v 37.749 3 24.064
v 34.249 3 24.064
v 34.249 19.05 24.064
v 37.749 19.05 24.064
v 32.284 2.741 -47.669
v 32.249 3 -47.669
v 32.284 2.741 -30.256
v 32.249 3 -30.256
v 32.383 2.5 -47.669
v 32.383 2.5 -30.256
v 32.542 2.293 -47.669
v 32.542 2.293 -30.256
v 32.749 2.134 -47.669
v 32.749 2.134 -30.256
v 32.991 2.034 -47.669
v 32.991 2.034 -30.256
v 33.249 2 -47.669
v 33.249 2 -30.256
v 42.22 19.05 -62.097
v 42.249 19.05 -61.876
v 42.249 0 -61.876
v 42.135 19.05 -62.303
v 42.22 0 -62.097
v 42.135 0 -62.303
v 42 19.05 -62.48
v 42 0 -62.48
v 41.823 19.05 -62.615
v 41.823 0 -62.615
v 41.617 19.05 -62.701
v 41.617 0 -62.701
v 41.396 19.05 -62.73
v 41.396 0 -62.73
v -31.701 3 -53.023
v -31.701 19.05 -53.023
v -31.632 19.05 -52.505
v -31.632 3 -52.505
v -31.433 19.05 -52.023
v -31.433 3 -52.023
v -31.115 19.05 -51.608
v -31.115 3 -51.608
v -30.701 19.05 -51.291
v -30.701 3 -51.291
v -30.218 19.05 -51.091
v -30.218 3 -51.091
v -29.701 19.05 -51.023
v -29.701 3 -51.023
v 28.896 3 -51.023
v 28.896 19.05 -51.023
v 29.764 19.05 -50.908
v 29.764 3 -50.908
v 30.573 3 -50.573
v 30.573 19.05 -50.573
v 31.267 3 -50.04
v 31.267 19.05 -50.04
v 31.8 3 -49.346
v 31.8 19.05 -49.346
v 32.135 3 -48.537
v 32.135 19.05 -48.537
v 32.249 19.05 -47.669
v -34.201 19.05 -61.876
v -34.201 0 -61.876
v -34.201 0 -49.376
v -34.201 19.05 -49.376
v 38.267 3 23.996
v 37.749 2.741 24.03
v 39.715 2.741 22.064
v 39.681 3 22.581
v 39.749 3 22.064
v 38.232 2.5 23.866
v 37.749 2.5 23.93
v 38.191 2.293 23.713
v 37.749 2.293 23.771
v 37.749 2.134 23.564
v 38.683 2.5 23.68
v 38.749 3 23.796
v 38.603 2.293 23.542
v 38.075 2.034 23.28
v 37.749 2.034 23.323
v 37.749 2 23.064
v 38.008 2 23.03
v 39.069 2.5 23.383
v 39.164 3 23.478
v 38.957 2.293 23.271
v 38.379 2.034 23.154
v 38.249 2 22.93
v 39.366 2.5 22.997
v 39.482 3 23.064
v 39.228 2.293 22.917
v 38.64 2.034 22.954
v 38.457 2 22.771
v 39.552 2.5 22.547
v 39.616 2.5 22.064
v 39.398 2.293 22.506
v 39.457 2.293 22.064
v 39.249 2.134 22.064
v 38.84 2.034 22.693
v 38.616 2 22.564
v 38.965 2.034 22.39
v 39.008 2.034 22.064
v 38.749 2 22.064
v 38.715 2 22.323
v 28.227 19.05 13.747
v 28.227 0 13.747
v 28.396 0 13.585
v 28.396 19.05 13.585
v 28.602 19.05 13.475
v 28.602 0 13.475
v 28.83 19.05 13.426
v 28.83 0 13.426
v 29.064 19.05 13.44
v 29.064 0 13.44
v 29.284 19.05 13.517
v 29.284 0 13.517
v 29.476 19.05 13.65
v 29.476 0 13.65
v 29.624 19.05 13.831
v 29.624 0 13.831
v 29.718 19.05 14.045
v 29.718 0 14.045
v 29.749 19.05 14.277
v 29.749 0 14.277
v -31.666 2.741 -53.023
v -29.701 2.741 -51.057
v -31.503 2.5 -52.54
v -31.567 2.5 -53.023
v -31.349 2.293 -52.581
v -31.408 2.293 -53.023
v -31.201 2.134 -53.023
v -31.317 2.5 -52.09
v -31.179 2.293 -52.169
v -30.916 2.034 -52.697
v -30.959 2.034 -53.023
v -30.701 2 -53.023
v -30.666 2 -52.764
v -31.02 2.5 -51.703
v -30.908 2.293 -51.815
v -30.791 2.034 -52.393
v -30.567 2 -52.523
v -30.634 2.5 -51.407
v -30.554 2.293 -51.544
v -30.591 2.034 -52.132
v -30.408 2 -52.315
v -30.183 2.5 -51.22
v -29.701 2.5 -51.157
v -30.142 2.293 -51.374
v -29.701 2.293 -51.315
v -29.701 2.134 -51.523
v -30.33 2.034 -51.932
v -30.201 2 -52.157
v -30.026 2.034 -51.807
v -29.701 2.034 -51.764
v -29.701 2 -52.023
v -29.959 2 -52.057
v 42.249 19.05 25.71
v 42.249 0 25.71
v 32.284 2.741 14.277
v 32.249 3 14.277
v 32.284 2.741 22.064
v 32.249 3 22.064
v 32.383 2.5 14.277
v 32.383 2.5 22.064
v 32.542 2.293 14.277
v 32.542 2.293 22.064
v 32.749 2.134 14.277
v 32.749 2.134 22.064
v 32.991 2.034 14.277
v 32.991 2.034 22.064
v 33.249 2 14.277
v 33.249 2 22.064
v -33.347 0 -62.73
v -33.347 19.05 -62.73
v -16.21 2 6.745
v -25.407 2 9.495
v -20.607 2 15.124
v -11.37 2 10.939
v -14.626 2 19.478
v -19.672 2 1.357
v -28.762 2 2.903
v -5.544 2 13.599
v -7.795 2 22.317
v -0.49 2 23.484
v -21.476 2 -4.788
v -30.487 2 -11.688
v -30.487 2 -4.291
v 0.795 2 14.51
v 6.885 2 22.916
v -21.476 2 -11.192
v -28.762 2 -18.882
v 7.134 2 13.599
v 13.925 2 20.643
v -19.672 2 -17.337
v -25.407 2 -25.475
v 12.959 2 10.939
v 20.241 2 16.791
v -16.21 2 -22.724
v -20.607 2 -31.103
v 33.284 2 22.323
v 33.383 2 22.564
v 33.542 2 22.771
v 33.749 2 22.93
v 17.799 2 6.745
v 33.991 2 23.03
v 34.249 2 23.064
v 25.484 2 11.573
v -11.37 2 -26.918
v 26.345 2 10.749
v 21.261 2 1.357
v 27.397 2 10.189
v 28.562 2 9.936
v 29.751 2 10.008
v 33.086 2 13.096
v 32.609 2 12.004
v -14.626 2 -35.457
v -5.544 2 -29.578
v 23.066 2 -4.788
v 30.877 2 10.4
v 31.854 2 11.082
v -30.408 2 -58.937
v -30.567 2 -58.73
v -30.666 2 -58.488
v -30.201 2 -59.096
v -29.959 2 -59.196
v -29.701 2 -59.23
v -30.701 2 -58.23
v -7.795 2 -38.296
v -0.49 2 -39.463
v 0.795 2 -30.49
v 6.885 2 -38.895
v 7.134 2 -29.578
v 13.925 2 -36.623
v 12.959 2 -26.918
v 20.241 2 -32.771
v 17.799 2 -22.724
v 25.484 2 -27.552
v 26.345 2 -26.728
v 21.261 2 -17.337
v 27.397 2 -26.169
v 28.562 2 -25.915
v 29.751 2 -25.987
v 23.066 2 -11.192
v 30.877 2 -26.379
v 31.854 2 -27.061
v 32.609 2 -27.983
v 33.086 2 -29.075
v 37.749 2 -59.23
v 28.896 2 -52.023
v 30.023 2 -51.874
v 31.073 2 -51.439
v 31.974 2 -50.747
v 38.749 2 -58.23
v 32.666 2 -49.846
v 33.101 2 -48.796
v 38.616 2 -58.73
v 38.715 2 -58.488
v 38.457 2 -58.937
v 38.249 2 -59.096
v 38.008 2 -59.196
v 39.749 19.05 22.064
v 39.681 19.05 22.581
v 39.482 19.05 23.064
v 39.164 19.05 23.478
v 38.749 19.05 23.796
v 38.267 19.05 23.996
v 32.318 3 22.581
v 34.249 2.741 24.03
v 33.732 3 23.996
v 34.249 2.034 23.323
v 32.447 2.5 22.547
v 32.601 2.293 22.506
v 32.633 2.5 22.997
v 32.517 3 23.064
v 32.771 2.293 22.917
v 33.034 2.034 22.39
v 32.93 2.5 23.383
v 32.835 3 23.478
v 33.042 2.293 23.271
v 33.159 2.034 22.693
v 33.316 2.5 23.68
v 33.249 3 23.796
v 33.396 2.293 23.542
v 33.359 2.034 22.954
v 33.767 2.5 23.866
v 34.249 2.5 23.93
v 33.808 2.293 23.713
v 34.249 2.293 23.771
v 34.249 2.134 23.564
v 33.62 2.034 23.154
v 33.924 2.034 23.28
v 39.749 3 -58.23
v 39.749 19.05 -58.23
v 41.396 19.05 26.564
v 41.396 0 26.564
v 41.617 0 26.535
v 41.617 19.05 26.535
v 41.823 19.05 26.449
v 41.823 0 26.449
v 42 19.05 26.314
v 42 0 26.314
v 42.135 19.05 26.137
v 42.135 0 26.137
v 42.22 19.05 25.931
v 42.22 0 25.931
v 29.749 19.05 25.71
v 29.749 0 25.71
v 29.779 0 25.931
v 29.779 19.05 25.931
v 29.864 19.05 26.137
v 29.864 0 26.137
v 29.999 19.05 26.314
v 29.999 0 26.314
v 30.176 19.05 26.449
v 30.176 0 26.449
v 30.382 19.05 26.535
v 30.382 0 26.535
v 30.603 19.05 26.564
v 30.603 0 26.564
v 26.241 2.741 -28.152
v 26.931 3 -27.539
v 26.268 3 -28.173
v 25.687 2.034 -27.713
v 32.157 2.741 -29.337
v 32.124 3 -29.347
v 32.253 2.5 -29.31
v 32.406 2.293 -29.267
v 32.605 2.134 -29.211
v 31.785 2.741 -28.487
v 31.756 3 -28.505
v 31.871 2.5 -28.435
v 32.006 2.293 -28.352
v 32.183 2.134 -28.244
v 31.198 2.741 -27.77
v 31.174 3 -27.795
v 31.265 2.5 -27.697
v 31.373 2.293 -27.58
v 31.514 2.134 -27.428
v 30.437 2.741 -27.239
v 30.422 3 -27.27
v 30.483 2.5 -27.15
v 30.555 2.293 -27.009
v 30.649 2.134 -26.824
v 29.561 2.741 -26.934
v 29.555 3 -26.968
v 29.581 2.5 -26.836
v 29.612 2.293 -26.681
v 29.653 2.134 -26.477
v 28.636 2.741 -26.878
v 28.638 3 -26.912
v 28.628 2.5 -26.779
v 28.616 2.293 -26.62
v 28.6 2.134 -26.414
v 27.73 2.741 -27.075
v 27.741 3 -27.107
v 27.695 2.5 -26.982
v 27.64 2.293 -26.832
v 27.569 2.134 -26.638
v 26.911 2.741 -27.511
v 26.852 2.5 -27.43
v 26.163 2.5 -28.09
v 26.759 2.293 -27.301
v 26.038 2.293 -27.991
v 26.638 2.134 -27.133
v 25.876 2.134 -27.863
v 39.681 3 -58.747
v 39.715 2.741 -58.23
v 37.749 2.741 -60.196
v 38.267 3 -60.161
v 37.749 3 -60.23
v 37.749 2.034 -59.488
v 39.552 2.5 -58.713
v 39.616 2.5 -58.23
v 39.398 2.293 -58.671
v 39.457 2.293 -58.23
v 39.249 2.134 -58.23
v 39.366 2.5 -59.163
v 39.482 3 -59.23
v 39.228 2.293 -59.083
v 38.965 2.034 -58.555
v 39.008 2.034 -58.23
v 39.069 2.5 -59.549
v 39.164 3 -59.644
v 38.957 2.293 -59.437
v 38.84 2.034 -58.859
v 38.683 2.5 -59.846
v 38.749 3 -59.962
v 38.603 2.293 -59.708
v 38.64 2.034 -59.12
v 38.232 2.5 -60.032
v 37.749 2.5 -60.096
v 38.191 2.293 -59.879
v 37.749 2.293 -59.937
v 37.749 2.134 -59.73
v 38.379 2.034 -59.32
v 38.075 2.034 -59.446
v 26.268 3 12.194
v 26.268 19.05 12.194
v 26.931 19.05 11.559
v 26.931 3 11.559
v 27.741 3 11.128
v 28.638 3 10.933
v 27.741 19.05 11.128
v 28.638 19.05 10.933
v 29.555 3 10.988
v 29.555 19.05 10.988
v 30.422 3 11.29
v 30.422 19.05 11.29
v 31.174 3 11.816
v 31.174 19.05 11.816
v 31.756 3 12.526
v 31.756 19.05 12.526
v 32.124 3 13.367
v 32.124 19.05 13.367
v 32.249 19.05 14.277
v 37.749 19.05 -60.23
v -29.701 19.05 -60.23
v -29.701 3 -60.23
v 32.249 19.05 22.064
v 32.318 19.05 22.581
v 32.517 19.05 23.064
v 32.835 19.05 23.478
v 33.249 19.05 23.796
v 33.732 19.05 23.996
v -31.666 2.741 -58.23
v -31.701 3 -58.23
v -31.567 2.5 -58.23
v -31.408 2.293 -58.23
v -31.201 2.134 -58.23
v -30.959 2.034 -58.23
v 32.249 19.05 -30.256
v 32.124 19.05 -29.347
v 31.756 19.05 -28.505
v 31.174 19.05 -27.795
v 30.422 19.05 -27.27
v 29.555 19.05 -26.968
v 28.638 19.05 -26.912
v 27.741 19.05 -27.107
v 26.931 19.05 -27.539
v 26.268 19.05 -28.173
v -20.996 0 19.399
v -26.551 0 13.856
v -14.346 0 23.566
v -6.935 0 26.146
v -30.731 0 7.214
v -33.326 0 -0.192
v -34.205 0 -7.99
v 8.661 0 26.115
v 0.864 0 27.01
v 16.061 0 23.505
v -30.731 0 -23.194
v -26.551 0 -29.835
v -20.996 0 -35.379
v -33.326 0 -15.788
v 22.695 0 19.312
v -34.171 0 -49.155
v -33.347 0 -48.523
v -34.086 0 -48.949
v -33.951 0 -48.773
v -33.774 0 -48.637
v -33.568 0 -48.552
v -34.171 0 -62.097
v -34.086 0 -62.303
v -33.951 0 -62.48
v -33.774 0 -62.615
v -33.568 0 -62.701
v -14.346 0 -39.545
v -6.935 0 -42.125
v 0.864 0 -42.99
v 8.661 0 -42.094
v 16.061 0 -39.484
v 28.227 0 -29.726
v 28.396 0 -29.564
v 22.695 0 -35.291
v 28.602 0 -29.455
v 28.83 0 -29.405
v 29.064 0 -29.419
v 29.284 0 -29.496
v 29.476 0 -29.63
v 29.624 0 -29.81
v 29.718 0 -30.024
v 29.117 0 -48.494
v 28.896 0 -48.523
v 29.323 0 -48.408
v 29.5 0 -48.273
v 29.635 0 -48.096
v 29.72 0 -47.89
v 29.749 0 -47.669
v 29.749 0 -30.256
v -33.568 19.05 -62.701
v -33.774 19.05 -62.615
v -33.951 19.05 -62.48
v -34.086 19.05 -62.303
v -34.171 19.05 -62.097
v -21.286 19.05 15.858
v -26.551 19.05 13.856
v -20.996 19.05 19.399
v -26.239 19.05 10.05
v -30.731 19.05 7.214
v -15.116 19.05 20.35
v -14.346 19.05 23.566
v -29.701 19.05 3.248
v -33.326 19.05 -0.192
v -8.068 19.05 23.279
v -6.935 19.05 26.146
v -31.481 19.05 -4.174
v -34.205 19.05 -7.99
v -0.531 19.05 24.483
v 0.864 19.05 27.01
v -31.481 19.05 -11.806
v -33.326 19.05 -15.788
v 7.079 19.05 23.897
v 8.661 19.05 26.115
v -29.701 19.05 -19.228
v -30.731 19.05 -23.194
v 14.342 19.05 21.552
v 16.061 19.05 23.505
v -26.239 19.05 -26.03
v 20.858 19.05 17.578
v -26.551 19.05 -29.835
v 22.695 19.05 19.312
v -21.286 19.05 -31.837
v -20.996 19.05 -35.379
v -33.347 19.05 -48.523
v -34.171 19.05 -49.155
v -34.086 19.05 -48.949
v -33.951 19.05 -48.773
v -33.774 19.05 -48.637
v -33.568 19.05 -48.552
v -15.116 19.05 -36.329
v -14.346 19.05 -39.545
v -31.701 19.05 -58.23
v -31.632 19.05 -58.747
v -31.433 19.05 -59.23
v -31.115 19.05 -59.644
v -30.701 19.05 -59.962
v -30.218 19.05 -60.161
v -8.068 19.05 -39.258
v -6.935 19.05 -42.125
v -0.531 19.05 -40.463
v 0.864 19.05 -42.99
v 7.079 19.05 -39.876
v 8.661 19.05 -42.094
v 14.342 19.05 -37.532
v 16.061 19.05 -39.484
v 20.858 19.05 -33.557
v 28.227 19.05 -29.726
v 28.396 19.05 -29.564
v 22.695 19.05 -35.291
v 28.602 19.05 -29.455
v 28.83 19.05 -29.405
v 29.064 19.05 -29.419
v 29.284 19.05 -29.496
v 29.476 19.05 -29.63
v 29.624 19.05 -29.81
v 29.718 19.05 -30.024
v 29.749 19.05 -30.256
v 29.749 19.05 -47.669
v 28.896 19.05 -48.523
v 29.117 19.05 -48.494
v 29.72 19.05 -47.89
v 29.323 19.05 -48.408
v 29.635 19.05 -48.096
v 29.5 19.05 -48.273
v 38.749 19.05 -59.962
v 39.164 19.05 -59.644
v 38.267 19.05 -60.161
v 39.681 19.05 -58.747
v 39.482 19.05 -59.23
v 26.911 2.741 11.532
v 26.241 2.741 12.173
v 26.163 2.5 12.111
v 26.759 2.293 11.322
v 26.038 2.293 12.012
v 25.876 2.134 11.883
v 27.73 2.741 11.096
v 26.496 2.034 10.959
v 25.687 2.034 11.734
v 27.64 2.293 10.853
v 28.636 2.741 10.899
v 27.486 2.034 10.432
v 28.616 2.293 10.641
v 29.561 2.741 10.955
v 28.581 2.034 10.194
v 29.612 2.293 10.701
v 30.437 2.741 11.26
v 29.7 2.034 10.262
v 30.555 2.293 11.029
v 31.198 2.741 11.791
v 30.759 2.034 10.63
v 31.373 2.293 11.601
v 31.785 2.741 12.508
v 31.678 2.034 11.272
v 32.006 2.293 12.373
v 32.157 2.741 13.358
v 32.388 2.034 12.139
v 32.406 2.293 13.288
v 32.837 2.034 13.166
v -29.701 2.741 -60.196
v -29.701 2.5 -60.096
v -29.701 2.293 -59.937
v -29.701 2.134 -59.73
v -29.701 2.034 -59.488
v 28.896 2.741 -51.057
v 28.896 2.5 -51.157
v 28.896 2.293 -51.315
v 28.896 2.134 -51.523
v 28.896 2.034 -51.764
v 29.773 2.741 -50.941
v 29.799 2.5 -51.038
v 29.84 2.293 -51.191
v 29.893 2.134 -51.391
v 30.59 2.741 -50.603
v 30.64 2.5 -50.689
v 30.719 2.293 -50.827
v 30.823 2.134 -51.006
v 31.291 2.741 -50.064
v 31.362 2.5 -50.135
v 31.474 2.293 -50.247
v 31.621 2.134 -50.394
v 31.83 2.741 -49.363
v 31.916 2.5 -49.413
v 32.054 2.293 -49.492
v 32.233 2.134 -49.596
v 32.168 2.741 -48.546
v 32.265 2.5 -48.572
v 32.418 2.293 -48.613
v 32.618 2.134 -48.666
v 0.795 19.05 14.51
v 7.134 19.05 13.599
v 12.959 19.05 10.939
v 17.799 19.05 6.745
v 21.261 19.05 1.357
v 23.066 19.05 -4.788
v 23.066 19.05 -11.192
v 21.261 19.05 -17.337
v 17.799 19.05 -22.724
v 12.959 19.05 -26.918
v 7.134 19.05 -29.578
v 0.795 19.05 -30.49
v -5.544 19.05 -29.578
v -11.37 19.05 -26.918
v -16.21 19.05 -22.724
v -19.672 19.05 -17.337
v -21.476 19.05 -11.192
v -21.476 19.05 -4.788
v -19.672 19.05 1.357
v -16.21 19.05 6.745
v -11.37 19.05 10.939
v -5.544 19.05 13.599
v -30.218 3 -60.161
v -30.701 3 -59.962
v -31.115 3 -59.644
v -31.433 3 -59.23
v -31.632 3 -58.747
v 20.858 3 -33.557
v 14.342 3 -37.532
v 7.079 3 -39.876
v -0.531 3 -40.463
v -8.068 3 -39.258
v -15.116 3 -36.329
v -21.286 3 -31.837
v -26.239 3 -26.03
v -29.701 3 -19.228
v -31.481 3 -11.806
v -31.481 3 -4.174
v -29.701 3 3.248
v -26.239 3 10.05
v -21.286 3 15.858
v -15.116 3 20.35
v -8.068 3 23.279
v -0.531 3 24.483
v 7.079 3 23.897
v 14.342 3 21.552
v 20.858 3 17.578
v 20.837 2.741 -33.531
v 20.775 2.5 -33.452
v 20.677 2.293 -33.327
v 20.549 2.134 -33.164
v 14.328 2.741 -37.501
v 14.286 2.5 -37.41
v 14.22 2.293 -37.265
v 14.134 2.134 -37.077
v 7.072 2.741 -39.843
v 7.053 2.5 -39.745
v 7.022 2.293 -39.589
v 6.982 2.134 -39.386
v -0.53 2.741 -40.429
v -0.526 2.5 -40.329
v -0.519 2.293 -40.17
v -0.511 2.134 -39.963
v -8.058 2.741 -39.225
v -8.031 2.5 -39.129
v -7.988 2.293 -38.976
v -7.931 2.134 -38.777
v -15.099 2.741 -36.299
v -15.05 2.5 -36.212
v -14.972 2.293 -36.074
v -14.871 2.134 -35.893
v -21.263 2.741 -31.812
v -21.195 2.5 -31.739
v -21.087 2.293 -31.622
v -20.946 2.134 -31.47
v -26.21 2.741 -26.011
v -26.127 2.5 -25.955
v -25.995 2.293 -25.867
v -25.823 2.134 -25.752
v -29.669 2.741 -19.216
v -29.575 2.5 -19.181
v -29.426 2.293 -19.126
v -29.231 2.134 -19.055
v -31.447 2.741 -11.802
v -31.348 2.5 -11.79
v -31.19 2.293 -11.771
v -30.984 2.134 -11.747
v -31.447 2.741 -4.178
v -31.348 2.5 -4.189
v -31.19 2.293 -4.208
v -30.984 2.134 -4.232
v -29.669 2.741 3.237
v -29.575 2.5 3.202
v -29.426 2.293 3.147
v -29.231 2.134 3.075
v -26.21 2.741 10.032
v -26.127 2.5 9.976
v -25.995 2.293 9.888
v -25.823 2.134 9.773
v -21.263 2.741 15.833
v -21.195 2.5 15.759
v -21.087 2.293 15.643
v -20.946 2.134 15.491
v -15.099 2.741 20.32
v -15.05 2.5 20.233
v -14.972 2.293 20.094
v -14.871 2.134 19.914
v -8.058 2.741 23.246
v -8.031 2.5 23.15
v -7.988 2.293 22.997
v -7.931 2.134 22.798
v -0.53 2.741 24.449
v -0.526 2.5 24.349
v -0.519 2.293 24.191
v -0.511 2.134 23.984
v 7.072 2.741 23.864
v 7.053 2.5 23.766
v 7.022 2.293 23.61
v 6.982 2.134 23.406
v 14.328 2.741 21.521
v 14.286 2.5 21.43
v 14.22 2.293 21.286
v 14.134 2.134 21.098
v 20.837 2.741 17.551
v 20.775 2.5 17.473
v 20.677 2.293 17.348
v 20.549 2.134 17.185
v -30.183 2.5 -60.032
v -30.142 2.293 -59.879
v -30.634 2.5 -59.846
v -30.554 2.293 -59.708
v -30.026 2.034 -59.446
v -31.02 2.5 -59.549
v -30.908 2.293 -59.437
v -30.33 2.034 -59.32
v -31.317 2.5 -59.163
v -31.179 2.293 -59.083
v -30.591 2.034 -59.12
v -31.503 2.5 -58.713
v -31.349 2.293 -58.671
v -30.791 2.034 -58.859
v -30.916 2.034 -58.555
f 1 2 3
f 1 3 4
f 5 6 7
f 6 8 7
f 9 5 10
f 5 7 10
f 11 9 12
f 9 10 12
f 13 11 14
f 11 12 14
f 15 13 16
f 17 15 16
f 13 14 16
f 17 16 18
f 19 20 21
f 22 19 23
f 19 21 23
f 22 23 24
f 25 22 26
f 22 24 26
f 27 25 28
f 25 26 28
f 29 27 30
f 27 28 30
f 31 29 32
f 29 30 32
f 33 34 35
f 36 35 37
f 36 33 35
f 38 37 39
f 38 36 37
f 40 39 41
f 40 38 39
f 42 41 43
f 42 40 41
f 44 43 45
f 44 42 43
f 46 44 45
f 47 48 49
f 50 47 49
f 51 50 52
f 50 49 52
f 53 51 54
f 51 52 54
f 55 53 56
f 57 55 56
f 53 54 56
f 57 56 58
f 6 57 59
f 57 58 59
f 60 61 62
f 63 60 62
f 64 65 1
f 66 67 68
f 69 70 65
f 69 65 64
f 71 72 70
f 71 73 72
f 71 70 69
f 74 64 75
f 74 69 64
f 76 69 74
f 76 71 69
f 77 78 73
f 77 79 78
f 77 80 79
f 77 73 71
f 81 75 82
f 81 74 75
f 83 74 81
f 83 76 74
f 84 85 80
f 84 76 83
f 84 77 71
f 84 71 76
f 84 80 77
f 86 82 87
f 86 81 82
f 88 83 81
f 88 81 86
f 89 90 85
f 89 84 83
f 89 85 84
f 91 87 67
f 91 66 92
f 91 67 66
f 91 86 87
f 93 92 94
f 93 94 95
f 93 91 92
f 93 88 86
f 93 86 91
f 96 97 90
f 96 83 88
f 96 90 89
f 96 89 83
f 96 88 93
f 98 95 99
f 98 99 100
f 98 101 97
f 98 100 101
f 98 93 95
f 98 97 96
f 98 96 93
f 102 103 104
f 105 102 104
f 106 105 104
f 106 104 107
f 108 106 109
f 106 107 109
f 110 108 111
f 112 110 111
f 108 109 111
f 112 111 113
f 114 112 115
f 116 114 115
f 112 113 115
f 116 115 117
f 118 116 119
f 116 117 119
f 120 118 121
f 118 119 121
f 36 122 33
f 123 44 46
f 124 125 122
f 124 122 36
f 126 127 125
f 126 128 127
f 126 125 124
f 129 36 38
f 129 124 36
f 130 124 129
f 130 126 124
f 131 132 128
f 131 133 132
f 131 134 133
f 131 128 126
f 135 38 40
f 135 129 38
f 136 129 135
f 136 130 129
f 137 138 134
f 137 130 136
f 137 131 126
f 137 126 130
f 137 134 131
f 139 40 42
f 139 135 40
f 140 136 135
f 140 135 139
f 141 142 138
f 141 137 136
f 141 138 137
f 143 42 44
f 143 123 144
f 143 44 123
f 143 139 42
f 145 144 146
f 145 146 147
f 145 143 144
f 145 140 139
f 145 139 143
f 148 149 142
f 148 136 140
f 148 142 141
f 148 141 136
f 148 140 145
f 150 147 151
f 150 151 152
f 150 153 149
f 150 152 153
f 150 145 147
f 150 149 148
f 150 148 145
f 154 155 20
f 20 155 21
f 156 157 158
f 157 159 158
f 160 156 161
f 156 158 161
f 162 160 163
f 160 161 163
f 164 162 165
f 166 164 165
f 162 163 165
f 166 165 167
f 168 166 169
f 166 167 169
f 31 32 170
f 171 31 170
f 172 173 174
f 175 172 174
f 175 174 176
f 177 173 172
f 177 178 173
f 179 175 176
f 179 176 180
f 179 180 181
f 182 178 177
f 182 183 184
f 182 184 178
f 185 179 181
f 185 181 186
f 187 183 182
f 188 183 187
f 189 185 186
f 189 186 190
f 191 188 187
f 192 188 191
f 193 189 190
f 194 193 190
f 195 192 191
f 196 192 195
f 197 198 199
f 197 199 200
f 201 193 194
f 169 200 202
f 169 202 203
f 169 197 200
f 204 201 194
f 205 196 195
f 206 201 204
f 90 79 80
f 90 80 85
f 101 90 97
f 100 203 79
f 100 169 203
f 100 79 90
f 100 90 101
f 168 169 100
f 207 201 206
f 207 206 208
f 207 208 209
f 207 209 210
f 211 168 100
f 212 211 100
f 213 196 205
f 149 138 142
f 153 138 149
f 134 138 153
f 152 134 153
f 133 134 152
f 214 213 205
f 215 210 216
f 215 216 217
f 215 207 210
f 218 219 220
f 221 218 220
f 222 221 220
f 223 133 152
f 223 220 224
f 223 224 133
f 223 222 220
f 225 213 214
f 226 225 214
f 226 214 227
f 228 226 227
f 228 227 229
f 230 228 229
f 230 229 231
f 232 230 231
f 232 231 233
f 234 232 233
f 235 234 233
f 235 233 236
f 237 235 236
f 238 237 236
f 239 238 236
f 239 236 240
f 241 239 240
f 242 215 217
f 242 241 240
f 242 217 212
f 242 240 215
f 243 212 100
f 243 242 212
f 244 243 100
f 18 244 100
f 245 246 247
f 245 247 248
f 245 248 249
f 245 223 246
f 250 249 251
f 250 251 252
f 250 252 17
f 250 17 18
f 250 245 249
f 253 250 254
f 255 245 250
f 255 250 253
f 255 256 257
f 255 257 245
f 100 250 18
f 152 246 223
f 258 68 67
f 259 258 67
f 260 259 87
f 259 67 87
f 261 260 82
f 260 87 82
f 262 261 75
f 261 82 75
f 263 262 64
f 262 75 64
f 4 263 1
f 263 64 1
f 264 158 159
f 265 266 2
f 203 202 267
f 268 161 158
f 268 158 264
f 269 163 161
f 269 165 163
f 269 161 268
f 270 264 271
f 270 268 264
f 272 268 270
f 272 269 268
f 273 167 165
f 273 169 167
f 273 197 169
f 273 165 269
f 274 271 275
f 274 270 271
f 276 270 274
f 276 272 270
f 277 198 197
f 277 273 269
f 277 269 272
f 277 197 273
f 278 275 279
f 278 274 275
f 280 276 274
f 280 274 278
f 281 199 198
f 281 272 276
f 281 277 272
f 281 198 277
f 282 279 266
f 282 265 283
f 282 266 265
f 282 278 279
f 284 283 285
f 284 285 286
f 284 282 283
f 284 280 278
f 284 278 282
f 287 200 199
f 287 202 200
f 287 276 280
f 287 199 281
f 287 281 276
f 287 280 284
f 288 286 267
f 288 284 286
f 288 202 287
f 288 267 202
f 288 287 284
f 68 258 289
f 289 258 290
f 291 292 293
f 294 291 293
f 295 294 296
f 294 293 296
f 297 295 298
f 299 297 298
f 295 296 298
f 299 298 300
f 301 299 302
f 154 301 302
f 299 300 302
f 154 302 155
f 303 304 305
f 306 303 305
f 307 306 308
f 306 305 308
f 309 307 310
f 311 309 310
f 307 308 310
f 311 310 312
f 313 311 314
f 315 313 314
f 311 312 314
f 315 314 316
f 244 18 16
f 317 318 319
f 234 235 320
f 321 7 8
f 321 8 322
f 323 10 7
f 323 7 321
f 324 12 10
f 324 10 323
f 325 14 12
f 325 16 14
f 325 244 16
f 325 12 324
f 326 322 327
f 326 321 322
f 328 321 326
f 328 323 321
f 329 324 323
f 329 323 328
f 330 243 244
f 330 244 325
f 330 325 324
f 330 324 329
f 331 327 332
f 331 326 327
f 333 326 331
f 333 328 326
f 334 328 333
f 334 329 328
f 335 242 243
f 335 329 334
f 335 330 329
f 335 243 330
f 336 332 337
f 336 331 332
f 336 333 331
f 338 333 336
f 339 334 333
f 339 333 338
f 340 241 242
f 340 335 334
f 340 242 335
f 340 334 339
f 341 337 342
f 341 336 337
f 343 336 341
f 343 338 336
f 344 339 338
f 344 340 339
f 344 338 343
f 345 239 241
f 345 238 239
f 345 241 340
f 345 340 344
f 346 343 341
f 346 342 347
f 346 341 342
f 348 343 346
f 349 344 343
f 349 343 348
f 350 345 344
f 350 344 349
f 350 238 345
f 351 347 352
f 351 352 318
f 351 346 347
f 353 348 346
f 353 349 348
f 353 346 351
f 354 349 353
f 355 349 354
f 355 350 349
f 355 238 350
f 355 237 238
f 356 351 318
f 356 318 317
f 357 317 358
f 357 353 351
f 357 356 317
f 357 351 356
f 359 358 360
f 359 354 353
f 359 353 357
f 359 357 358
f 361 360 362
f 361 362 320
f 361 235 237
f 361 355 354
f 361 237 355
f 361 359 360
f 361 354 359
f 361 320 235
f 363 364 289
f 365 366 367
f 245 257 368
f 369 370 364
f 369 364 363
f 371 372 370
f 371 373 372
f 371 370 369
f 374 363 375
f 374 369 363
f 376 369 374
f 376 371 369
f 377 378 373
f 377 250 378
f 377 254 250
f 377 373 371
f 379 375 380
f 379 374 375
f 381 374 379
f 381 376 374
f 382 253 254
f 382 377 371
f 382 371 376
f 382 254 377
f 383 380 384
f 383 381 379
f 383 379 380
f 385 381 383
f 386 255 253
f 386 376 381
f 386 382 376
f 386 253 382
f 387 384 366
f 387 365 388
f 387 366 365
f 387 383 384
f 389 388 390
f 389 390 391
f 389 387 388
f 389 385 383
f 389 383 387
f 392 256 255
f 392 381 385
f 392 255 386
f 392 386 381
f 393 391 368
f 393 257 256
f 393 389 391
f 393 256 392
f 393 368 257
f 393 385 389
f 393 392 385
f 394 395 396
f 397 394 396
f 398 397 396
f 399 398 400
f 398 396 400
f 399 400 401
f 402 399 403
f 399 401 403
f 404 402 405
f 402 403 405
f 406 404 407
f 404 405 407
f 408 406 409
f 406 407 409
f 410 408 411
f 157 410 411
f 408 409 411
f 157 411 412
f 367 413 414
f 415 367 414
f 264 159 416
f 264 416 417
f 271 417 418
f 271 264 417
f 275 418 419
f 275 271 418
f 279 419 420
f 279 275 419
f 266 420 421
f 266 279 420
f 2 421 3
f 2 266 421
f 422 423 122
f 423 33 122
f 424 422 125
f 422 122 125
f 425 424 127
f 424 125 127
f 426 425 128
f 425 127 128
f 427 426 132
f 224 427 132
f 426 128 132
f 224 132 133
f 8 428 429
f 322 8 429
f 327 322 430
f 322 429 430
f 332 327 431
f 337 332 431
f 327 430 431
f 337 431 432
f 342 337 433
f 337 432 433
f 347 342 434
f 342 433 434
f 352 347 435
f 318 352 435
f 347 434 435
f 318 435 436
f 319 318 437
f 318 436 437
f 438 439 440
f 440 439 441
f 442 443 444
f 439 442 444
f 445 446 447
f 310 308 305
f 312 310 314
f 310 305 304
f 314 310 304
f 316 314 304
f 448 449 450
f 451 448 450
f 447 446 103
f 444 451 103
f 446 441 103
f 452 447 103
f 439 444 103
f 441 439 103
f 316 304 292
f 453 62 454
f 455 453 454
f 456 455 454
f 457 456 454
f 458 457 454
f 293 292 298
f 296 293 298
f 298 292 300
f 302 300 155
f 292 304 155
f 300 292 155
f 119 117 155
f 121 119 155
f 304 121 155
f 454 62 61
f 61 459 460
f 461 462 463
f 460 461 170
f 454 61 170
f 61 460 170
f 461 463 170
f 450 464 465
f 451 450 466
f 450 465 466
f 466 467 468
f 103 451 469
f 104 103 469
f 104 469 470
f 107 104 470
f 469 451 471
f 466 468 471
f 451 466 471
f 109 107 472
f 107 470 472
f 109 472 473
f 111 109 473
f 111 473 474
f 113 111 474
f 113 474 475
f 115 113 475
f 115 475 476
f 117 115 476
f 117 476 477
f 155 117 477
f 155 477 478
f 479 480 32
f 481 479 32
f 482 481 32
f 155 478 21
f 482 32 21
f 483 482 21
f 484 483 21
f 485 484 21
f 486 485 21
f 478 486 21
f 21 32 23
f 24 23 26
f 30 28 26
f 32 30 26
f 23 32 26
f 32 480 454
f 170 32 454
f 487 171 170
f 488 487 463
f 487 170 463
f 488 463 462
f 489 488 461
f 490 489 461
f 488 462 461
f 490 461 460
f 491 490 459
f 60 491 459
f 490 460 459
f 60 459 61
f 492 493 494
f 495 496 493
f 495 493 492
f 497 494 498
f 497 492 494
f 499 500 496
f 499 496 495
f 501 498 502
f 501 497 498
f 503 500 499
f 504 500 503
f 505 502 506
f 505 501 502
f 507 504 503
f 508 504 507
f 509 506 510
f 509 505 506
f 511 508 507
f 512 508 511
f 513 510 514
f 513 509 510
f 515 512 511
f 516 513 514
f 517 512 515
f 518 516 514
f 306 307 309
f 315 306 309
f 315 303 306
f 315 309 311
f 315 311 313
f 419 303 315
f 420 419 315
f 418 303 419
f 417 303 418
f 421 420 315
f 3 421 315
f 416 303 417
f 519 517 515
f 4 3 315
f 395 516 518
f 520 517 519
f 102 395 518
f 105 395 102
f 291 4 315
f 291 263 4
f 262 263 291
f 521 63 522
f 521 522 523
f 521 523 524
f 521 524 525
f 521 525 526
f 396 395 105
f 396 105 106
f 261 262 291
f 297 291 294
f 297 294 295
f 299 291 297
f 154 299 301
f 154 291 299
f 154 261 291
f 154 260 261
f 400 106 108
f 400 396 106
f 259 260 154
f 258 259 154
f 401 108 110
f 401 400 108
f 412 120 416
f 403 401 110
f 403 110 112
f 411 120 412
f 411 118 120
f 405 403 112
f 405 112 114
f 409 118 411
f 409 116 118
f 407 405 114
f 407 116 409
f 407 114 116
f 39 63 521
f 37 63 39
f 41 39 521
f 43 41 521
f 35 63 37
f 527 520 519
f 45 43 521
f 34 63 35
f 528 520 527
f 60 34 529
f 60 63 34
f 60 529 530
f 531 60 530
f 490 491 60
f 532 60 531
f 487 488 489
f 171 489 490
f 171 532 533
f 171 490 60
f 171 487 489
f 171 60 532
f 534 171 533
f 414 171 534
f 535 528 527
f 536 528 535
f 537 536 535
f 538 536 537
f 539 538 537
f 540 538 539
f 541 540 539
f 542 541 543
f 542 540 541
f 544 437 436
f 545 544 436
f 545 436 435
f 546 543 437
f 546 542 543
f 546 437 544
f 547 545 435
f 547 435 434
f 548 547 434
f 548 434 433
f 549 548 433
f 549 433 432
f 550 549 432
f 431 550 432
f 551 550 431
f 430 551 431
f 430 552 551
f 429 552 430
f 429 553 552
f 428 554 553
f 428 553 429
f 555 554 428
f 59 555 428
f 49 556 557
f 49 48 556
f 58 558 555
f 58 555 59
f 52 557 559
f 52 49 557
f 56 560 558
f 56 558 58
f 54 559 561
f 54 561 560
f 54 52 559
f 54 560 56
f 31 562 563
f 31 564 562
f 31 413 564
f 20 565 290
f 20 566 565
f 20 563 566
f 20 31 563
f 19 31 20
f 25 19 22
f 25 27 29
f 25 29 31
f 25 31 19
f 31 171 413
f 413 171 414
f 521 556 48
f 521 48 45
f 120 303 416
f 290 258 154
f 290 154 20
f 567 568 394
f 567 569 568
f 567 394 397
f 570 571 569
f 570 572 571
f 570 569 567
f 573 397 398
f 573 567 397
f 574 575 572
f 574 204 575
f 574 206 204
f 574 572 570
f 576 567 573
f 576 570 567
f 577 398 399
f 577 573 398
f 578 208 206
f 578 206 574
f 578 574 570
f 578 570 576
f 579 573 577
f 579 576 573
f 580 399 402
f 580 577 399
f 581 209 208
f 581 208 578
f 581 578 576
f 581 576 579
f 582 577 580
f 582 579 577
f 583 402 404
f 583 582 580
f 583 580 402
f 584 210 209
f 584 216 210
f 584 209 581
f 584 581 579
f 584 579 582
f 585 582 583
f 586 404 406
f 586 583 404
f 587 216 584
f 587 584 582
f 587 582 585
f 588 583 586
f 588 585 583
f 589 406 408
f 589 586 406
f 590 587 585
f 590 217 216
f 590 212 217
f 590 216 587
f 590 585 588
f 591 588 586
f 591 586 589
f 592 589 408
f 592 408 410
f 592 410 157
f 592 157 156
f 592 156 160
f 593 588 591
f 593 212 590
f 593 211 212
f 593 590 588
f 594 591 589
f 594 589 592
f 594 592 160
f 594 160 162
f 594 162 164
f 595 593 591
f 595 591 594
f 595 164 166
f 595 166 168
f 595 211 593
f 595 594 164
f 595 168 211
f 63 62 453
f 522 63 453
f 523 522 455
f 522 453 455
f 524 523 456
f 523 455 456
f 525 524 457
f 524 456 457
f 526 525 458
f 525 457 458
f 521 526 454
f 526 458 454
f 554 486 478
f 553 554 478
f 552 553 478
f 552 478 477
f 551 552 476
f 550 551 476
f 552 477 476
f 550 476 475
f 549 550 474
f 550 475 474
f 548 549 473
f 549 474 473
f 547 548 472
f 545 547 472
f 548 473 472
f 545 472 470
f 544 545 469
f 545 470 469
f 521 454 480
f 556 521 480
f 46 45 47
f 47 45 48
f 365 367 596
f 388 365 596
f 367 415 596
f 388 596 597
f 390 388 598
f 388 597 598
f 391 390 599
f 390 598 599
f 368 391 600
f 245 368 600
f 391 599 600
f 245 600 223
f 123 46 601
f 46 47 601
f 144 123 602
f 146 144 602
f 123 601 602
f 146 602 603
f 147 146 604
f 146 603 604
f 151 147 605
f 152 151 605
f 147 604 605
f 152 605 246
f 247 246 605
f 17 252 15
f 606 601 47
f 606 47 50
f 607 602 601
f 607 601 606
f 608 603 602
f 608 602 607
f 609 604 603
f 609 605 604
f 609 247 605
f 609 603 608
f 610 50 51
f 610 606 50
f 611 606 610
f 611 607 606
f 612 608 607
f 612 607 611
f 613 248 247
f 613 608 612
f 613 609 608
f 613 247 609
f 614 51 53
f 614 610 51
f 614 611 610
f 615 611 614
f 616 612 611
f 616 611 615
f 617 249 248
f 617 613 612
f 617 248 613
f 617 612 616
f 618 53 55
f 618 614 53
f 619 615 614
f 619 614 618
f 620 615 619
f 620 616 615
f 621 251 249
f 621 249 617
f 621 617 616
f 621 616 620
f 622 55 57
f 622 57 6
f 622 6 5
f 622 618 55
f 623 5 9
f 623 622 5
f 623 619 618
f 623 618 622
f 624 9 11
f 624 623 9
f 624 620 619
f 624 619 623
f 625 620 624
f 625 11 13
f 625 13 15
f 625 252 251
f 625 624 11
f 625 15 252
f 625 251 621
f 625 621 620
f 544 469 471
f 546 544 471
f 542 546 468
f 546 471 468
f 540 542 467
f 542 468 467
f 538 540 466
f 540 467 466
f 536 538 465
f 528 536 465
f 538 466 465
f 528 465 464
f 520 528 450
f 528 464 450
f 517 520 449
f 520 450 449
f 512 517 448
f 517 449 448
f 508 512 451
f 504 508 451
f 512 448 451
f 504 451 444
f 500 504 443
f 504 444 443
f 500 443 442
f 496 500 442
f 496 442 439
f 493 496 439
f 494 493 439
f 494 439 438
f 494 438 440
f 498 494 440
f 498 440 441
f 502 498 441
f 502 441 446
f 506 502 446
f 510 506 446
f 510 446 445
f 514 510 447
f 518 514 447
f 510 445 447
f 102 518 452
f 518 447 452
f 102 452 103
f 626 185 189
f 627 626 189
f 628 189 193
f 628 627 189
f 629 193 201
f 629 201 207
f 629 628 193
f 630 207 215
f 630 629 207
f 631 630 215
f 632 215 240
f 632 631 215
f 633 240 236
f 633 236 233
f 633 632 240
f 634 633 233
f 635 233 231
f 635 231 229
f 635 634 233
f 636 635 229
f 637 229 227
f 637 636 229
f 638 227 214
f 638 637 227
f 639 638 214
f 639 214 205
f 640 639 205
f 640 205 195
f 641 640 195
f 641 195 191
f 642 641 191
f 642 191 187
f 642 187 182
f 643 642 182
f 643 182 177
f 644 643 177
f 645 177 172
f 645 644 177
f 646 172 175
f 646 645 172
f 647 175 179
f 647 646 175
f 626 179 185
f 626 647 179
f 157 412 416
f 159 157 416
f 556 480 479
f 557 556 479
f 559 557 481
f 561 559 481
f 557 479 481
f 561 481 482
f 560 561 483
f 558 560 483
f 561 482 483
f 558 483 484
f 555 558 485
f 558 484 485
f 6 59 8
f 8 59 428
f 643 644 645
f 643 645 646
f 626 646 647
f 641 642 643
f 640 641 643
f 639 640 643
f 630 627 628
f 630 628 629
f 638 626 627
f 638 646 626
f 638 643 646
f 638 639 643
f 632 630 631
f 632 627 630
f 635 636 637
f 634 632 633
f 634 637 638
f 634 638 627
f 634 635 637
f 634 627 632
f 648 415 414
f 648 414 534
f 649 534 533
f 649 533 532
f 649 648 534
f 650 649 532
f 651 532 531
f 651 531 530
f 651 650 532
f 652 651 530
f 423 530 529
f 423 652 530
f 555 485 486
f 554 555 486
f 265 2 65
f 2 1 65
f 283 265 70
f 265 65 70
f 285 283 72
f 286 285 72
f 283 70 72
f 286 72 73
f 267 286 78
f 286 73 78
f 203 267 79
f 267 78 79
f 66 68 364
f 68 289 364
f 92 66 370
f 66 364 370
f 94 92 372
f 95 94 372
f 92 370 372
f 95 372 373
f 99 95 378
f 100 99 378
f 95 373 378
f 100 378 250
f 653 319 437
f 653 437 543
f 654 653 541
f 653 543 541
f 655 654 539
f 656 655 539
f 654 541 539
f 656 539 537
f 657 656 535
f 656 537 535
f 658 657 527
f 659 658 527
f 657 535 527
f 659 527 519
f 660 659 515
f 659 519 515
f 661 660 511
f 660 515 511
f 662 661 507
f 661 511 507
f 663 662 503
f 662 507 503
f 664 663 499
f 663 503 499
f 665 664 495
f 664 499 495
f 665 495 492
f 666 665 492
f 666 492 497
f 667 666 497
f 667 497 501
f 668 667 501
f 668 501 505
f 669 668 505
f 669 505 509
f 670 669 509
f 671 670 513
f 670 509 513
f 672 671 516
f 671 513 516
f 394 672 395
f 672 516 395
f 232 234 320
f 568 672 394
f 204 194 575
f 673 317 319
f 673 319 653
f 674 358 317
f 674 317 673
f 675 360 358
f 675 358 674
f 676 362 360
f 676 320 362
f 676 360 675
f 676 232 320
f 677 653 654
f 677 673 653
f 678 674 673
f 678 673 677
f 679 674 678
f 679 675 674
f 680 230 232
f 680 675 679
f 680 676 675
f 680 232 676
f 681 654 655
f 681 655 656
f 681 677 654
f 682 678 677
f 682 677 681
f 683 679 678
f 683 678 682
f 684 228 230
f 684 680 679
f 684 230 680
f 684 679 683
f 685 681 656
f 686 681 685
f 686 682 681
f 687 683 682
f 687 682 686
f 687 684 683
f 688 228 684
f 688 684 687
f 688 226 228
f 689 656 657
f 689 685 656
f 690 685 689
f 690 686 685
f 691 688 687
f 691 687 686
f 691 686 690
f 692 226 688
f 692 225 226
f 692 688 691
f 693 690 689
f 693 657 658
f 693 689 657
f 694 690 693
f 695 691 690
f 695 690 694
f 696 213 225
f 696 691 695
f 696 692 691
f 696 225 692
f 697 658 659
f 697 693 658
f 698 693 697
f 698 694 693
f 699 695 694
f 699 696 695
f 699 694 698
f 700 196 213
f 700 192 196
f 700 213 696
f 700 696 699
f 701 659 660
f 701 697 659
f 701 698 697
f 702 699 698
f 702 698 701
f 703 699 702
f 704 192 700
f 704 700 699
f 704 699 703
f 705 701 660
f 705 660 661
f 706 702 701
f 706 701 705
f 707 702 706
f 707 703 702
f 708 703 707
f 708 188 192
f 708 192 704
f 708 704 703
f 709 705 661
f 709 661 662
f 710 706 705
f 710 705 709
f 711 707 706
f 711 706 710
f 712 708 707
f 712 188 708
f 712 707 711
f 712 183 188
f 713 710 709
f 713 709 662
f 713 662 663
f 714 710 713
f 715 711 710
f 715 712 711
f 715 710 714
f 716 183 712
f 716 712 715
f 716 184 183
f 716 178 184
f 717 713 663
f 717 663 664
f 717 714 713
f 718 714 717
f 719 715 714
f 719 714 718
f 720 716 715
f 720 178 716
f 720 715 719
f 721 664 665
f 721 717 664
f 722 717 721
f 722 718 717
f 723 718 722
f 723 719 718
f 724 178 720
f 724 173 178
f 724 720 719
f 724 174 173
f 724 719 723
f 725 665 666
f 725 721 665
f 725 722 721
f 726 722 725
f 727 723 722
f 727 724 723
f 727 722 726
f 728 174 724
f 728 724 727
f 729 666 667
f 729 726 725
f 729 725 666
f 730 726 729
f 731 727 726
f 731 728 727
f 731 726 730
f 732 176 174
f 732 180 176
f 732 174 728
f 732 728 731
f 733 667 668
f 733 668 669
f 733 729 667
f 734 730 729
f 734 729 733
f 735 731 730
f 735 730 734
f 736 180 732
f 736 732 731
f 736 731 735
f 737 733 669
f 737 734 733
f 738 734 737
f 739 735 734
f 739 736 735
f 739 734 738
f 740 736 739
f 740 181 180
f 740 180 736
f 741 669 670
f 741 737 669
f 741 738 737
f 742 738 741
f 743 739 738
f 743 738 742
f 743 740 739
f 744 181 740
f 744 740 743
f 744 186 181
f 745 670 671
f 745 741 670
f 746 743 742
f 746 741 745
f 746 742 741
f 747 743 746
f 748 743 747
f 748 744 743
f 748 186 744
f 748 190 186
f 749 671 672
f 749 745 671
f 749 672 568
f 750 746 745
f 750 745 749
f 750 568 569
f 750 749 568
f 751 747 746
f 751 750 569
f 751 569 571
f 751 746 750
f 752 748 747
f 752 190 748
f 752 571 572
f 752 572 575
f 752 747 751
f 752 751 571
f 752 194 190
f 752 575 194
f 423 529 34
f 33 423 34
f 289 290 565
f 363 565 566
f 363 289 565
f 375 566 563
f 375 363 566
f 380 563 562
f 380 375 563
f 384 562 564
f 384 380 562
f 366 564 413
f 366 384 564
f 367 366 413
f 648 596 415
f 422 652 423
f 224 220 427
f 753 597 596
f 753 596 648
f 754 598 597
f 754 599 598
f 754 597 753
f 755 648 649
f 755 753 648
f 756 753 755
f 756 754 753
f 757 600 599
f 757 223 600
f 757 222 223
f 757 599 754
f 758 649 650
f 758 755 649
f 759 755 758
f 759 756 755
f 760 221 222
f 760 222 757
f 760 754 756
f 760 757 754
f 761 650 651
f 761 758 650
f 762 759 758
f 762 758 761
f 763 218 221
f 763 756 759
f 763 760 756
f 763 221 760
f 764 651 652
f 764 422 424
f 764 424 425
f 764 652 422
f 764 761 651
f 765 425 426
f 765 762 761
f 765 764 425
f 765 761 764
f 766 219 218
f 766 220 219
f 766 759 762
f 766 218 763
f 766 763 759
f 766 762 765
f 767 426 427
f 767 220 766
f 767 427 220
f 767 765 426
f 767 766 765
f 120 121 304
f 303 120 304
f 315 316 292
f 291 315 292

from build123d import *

# Parameters (mm, degrees)
BOSS_EXTRUDE1_DEPTH = 19.05
SKETCH2_R           = 22.5
CUT_EXTRUDE1_DEPTH  = 17.05
FILLET1_R           = 2
FILLET2_R           = 1


with BuildPart() as part:
    # Sketch1 → Boss-Extrude1 (new body)
    with BuildSketch(Plane(origin=(0, 0, 0), x_dir=(1, 0, 0), z_dir=(0, 1, 0))):
        with BuildLine():
            Line((30.602986827, -26.563786798), (41.395992873, -26.563786798))
            ThreePointArc((41.395992873, -26.563786798), (41.999506373, -26.313803321), (42.24948985, -25.710289821))
            Line((42.24948985, -25.710289821), (42.24948985, 54.289710179))
            Line((42.24948985, 54.289710179), (42.24948985, 61.876099251))
            ThreePointArc((42.24948985, 61.876099251), (41.999506373, 62.479612751), (41.395992873, 62.729596228))
            Line((41.395992873, 62.729596228), (-33.347013177, 62.729596228))
            ThreePointArc((-33.347013177, 62.729596228), (-33.950526677, 62.479612751), (-34.200510153, 61.876099251))
            Line((-34.200510153, 61.876099251), (-34.200510153, 49.376099251))
            ThreePointArc((-34.200510153, 49.376099251), (-33.950526677, 48.772585752), (-33.347013177, 48.522602275))
            Line((-33.347013177, 48.522602275), (28.895992873, 48.522602275))
            ThreePointArc((28.895992873, 48.522602275), (29.499506373, 48.272618798), (29.74948985, 47.669105298))
            Line((29.74948985, 47.669105298), (29.74948985, 30.255903719))
            ThreePointArc((29.74948985, 30.255903719), (29.176620882, 29.44986091), (28.227035694, 29.725853361))
            ThreePointArc((28.227035694, 29.725853361), (-34.205400414, 7.989675013), (28.227035694, -13.746503336))
            ThreePointArc((28.227035694, -13.746503336), (29.176620882, -13.470510884), (29.74948985, -14.276553693))
            Line((29.74948985, -14.276553693), (29.74948985, -25.710289821))
            ThreePointArc((29.74948985, -25.710289821), (29.999473327, -26.313803321), (30.602986827, -26.563786798))
        make_face()
    extrude(amount=BOSS_EXTRUDE1_DEPTH)

    # Sketch2 → Cut-Extrude1 (cut)
    with BuildSketch(Plane(origin=(0, 19.05, 0), x_dir=(1, 0, 0), z_dir=(0, 1, 0))):
        with BuildLine():
            Line((39.74948985, -24.063786798), (39.74948985, 60.229596228))
            Line((39.74948985, 60.229596228), (-31.700510153, 60.229596228))
            Line((-31.700510153, 60.229596228), (-31.700510153, 51.022602275))
            Line((-31.700510153, 51.022602275), (28.895992873, 51.022602275))
            ThreePointArc((28.895992873, 51.022602275), (31.267273326, 50.040385751), (32.24948985, 47.669105298))
            Line((32.24948985, 47.669105298), (32.24948985, 30.255903719))
            ThreePointArc((32.24948985, 30.255903719), (29.998615619, 27.088860136), (26.267575972, 28.173269194))
            ThreePointArc((26.267575972, 28.173269194), (-31.705400414, 7.989675013), (26.267575972, -12.193919168))
            ThreePointArc((26.267575972, -12.193919168), (29.998615619, -11.109510111), (32.24948985, -14.276553693))
            Line((32.24948985, -14.276553693), (32.24948985, -24.063786798))
            Line((32.24948985, -24.063786798), (39.74948985, -24.063786798))
        make_face()
        with Locations(Location((0.794599586, 7.989675013, 0), (0, 0, 270))):
            Circle(SKETCH2_R, mode=Mode.SUBTRACT)
    extrude(amount=-CUT_EXTRUDE1_DEPTH, mode=Mode.SUBTRACT)

    # Fillet1
    fillet1_edges = [part.edges().sort_by_distance(p)[0] for p in [
        (39.74948985, 10.525, 24.063786798),
        (32.24948985, 10.525, 24.063786798),
        (-31.700510153, 10.525, -51.022602275),
        (-31.700510153, 10.525, -60.229596228),
        (39.74948985, 10.525, -60.229596228),
    ]]
    fillet(fillet1_edges, radius=FILLET1_R)

    # Fillet2
    fillet2_edges = [part.edges().sort_by_distance(p)[0] for p in [
        (32.24948985, 2, 18.170170245),
        (29.998615619, 2, 11.109510111),
        (-31.705400414, 2, -7.989675013),
        (29.998615619, 2, -27.088860136),
        (32.24948985, 2, -38.962504508),
        (31.267273326, 2, -50.040385751),
        (35.99948985, 2, 24.063786798),
        (39.74948985, 2, -18.082904715),
        (4.024489848, 2, -60.229596228),
        (-31.700510153, 2, -55.626099251),
        (-0.40225864, 2, -51.022602275),
        (39.163703412, 2, -59.64380979),
        (-31.114723716, 2, -59.64380979),
        (-31.114723716, 2, -51.608388712),
        (39.163703412, 2, 23.47800036),
        (32.835276288, 2, 23.47800036),
    ]]
    fillet(fillet2_edges, radius=FILLET2_R)


solid = part.part
